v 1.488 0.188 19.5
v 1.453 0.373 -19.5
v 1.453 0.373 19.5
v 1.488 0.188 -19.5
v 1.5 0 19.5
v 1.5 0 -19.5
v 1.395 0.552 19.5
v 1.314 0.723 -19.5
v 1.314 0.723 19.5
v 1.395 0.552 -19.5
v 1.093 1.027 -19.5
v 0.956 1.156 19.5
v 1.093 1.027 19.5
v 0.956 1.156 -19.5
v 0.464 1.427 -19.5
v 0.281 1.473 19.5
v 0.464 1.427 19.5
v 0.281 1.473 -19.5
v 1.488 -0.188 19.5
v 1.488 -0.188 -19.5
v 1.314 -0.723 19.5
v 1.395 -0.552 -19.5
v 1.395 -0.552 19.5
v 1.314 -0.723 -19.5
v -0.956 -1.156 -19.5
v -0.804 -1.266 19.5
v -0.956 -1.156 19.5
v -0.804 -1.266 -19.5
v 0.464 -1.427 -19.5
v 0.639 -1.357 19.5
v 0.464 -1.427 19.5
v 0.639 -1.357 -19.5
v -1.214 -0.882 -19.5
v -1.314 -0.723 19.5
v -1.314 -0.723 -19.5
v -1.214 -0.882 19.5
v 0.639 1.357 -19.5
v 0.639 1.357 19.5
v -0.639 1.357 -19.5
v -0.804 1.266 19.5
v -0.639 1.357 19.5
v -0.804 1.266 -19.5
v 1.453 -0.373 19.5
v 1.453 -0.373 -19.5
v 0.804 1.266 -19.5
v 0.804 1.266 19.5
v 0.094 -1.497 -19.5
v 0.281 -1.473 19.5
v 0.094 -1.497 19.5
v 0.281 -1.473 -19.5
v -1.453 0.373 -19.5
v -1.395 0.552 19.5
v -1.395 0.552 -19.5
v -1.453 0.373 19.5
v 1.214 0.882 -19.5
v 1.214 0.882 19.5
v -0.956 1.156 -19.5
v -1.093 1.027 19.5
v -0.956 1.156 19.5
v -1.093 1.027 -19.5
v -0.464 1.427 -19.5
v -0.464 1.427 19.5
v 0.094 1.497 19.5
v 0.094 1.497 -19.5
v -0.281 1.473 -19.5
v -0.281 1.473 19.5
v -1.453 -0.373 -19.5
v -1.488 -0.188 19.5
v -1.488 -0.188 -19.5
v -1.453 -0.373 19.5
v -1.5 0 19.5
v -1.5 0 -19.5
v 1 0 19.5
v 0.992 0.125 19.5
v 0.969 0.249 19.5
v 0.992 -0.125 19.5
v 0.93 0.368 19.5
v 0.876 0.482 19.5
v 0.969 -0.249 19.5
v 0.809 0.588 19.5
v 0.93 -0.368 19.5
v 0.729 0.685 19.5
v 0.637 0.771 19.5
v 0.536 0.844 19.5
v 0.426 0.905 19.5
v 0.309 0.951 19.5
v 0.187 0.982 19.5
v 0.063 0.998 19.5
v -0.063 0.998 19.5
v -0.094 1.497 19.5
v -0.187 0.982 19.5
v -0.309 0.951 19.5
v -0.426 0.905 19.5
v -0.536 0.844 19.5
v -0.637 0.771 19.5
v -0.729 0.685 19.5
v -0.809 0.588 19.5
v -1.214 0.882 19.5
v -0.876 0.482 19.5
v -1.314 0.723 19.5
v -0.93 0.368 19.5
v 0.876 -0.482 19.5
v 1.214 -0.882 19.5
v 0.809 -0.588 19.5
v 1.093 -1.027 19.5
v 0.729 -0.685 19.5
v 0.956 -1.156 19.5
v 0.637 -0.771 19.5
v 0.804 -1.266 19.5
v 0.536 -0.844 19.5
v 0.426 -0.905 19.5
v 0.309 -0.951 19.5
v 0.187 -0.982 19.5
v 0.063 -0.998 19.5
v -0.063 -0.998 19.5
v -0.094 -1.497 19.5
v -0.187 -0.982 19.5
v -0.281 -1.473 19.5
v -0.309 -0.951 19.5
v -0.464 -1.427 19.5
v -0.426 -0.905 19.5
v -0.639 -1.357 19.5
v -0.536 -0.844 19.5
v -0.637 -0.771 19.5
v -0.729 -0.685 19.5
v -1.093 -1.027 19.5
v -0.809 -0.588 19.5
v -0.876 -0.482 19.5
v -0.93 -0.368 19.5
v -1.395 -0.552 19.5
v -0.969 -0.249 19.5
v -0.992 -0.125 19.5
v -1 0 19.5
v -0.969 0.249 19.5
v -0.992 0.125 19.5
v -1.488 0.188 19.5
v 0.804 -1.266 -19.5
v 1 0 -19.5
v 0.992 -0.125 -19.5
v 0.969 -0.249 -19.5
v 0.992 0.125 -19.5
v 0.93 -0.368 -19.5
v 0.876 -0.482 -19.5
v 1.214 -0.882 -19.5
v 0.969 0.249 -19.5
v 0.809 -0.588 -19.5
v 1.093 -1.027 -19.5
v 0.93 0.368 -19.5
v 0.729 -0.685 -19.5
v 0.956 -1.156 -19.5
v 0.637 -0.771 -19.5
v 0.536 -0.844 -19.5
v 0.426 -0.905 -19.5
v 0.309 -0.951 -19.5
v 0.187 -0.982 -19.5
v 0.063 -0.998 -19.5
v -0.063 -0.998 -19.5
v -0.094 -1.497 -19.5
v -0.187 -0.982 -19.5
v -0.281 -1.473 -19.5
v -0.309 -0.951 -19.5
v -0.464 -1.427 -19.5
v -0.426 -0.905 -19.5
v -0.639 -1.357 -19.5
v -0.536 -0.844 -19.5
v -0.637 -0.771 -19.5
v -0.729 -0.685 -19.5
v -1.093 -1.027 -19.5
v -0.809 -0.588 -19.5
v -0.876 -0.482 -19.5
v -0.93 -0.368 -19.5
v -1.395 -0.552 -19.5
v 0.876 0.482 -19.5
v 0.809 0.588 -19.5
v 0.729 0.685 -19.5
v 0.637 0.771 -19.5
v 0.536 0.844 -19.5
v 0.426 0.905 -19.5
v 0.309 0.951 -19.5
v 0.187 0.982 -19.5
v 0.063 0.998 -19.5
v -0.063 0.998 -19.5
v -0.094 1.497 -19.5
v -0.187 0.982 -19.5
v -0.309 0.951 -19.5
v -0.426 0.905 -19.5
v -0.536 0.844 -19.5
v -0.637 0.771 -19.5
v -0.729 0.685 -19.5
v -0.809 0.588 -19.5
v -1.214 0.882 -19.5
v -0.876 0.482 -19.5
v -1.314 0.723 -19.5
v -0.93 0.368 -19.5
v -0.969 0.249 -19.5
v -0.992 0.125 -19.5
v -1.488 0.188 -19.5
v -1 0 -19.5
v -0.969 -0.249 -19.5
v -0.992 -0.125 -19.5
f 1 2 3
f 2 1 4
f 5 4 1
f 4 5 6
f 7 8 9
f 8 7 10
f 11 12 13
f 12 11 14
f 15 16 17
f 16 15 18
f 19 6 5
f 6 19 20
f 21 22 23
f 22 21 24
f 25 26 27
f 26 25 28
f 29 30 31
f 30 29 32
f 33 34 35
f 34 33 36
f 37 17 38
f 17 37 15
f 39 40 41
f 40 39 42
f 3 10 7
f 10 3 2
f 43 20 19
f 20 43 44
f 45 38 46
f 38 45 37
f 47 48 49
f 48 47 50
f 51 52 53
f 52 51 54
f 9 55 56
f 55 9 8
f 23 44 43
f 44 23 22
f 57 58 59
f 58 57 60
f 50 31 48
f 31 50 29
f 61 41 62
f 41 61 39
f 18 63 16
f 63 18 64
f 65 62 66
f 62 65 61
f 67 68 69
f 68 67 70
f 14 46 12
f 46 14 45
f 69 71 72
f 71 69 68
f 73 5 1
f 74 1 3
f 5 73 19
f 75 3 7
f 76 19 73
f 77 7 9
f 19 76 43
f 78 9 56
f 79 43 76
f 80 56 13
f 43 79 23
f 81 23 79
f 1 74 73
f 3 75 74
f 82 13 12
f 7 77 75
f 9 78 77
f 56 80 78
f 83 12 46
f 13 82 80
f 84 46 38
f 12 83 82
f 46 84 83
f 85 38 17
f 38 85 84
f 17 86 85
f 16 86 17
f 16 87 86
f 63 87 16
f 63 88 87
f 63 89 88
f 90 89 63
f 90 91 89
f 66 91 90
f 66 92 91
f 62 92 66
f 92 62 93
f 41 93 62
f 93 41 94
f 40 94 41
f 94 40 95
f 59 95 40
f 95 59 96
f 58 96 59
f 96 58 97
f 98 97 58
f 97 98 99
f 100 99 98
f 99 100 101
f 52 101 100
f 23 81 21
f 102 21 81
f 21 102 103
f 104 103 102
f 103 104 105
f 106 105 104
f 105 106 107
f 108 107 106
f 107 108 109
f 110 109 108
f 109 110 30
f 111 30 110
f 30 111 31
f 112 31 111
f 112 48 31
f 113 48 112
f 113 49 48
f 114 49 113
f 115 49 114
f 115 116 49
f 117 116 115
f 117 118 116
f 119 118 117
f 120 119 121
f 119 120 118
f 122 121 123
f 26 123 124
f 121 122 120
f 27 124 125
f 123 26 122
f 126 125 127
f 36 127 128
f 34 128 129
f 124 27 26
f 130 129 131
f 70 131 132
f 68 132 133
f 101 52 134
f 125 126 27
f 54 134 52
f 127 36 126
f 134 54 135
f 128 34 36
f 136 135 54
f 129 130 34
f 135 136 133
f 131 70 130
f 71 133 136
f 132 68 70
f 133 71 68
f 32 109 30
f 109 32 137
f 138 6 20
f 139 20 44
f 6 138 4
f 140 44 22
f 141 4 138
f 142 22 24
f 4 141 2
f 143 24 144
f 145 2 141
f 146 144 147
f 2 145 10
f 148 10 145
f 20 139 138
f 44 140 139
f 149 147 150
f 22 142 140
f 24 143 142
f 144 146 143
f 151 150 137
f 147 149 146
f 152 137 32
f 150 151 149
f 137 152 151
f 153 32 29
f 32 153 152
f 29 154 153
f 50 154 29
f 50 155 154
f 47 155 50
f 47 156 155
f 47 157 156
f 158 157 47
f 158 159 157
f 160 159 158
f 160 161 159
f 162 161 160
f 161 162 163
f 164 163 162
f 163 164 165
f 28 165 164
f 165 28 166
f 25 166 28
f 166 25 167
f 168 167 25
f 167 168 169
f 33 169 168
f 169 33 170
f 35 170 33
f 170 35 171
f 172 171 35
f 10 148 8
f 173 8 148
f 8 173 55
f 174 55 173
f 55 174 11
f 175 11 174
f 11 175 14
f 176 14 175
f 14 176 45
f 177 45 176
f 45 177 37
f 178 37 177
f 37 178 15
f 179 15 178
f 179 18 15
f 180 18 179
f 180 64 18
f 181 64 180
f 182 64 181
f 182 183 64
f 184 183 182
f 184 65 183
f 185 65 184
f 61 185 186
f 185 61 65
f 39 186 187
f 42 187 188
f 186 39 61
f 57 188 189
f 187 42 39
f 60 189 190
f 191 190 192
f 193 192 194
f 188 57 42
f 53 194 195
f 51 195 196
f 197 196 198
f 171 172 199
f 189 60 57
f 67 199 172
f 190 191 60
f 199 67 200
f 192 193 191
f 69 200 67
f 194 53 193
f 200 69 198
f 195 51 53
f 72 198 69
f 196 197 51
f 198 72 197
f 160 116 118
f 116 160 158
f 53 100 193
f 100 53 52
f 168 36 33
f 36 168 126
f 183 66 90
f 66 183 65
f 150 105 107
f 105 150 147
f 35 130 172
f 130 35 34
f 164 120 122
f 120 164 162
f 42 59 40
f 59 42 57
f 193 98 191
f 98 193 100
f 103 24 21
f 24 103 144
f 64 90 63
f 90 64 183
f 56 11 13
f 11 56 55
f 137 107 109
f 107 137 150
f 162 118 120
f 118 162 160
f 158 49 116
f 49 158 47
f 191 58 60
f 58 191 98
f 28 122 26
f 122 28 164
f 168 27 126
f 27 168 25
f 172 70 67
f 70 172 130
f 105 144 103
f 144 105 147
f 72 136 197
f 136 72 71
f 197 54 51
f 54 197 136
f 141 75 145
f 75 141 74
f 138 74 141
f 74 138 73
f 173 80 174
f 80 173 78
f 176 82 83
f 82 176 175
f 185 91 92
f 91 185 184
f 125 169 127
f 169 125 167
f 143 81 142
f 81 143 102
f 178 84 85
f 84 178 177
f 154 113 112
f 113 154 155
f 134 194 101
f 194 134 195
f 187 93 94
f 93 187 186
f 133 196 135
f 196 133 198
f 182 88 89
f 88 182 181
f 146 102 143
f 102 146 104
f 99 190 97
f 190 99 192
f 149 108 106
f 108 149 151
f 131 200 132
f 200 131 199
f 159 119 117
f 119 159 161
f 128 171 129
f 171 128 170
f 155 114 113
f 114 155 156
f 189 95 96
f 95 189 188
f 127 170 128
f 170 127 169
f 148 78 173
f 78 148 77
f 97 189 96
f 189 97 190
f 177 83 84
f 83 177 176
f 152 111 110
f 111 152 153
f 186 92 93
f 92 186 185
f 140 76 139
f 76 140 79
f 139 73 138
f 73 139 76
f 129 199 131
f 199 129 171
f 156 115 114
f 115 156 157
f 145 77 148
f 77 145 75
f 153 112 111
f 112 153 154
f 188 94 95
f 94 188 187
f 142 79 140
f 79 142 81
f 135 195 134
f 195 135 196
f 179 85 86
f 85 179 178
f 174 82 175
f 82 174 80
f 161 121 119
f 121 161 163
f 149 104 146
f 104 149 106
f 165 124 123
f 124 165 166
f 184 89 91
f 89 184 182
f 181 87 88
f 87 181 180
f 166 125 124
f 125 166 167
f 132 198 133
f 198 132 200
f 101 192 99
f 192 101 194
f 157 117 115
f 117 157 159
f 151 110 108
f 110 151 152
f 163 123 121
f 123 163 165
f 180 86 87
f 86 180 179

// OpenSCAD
$fn = 50;


difference() {
	union() {
		translate(v = [0, 0, -19.5000000000]) {
			cylinder(h = 39, r = 1.5000000000);
		}
	}
	union() {
		translate(v = [0, 0, -100.0000000000]) {
			cylinder(h = 200, r = 1.0000000000);
		}
	}
}
